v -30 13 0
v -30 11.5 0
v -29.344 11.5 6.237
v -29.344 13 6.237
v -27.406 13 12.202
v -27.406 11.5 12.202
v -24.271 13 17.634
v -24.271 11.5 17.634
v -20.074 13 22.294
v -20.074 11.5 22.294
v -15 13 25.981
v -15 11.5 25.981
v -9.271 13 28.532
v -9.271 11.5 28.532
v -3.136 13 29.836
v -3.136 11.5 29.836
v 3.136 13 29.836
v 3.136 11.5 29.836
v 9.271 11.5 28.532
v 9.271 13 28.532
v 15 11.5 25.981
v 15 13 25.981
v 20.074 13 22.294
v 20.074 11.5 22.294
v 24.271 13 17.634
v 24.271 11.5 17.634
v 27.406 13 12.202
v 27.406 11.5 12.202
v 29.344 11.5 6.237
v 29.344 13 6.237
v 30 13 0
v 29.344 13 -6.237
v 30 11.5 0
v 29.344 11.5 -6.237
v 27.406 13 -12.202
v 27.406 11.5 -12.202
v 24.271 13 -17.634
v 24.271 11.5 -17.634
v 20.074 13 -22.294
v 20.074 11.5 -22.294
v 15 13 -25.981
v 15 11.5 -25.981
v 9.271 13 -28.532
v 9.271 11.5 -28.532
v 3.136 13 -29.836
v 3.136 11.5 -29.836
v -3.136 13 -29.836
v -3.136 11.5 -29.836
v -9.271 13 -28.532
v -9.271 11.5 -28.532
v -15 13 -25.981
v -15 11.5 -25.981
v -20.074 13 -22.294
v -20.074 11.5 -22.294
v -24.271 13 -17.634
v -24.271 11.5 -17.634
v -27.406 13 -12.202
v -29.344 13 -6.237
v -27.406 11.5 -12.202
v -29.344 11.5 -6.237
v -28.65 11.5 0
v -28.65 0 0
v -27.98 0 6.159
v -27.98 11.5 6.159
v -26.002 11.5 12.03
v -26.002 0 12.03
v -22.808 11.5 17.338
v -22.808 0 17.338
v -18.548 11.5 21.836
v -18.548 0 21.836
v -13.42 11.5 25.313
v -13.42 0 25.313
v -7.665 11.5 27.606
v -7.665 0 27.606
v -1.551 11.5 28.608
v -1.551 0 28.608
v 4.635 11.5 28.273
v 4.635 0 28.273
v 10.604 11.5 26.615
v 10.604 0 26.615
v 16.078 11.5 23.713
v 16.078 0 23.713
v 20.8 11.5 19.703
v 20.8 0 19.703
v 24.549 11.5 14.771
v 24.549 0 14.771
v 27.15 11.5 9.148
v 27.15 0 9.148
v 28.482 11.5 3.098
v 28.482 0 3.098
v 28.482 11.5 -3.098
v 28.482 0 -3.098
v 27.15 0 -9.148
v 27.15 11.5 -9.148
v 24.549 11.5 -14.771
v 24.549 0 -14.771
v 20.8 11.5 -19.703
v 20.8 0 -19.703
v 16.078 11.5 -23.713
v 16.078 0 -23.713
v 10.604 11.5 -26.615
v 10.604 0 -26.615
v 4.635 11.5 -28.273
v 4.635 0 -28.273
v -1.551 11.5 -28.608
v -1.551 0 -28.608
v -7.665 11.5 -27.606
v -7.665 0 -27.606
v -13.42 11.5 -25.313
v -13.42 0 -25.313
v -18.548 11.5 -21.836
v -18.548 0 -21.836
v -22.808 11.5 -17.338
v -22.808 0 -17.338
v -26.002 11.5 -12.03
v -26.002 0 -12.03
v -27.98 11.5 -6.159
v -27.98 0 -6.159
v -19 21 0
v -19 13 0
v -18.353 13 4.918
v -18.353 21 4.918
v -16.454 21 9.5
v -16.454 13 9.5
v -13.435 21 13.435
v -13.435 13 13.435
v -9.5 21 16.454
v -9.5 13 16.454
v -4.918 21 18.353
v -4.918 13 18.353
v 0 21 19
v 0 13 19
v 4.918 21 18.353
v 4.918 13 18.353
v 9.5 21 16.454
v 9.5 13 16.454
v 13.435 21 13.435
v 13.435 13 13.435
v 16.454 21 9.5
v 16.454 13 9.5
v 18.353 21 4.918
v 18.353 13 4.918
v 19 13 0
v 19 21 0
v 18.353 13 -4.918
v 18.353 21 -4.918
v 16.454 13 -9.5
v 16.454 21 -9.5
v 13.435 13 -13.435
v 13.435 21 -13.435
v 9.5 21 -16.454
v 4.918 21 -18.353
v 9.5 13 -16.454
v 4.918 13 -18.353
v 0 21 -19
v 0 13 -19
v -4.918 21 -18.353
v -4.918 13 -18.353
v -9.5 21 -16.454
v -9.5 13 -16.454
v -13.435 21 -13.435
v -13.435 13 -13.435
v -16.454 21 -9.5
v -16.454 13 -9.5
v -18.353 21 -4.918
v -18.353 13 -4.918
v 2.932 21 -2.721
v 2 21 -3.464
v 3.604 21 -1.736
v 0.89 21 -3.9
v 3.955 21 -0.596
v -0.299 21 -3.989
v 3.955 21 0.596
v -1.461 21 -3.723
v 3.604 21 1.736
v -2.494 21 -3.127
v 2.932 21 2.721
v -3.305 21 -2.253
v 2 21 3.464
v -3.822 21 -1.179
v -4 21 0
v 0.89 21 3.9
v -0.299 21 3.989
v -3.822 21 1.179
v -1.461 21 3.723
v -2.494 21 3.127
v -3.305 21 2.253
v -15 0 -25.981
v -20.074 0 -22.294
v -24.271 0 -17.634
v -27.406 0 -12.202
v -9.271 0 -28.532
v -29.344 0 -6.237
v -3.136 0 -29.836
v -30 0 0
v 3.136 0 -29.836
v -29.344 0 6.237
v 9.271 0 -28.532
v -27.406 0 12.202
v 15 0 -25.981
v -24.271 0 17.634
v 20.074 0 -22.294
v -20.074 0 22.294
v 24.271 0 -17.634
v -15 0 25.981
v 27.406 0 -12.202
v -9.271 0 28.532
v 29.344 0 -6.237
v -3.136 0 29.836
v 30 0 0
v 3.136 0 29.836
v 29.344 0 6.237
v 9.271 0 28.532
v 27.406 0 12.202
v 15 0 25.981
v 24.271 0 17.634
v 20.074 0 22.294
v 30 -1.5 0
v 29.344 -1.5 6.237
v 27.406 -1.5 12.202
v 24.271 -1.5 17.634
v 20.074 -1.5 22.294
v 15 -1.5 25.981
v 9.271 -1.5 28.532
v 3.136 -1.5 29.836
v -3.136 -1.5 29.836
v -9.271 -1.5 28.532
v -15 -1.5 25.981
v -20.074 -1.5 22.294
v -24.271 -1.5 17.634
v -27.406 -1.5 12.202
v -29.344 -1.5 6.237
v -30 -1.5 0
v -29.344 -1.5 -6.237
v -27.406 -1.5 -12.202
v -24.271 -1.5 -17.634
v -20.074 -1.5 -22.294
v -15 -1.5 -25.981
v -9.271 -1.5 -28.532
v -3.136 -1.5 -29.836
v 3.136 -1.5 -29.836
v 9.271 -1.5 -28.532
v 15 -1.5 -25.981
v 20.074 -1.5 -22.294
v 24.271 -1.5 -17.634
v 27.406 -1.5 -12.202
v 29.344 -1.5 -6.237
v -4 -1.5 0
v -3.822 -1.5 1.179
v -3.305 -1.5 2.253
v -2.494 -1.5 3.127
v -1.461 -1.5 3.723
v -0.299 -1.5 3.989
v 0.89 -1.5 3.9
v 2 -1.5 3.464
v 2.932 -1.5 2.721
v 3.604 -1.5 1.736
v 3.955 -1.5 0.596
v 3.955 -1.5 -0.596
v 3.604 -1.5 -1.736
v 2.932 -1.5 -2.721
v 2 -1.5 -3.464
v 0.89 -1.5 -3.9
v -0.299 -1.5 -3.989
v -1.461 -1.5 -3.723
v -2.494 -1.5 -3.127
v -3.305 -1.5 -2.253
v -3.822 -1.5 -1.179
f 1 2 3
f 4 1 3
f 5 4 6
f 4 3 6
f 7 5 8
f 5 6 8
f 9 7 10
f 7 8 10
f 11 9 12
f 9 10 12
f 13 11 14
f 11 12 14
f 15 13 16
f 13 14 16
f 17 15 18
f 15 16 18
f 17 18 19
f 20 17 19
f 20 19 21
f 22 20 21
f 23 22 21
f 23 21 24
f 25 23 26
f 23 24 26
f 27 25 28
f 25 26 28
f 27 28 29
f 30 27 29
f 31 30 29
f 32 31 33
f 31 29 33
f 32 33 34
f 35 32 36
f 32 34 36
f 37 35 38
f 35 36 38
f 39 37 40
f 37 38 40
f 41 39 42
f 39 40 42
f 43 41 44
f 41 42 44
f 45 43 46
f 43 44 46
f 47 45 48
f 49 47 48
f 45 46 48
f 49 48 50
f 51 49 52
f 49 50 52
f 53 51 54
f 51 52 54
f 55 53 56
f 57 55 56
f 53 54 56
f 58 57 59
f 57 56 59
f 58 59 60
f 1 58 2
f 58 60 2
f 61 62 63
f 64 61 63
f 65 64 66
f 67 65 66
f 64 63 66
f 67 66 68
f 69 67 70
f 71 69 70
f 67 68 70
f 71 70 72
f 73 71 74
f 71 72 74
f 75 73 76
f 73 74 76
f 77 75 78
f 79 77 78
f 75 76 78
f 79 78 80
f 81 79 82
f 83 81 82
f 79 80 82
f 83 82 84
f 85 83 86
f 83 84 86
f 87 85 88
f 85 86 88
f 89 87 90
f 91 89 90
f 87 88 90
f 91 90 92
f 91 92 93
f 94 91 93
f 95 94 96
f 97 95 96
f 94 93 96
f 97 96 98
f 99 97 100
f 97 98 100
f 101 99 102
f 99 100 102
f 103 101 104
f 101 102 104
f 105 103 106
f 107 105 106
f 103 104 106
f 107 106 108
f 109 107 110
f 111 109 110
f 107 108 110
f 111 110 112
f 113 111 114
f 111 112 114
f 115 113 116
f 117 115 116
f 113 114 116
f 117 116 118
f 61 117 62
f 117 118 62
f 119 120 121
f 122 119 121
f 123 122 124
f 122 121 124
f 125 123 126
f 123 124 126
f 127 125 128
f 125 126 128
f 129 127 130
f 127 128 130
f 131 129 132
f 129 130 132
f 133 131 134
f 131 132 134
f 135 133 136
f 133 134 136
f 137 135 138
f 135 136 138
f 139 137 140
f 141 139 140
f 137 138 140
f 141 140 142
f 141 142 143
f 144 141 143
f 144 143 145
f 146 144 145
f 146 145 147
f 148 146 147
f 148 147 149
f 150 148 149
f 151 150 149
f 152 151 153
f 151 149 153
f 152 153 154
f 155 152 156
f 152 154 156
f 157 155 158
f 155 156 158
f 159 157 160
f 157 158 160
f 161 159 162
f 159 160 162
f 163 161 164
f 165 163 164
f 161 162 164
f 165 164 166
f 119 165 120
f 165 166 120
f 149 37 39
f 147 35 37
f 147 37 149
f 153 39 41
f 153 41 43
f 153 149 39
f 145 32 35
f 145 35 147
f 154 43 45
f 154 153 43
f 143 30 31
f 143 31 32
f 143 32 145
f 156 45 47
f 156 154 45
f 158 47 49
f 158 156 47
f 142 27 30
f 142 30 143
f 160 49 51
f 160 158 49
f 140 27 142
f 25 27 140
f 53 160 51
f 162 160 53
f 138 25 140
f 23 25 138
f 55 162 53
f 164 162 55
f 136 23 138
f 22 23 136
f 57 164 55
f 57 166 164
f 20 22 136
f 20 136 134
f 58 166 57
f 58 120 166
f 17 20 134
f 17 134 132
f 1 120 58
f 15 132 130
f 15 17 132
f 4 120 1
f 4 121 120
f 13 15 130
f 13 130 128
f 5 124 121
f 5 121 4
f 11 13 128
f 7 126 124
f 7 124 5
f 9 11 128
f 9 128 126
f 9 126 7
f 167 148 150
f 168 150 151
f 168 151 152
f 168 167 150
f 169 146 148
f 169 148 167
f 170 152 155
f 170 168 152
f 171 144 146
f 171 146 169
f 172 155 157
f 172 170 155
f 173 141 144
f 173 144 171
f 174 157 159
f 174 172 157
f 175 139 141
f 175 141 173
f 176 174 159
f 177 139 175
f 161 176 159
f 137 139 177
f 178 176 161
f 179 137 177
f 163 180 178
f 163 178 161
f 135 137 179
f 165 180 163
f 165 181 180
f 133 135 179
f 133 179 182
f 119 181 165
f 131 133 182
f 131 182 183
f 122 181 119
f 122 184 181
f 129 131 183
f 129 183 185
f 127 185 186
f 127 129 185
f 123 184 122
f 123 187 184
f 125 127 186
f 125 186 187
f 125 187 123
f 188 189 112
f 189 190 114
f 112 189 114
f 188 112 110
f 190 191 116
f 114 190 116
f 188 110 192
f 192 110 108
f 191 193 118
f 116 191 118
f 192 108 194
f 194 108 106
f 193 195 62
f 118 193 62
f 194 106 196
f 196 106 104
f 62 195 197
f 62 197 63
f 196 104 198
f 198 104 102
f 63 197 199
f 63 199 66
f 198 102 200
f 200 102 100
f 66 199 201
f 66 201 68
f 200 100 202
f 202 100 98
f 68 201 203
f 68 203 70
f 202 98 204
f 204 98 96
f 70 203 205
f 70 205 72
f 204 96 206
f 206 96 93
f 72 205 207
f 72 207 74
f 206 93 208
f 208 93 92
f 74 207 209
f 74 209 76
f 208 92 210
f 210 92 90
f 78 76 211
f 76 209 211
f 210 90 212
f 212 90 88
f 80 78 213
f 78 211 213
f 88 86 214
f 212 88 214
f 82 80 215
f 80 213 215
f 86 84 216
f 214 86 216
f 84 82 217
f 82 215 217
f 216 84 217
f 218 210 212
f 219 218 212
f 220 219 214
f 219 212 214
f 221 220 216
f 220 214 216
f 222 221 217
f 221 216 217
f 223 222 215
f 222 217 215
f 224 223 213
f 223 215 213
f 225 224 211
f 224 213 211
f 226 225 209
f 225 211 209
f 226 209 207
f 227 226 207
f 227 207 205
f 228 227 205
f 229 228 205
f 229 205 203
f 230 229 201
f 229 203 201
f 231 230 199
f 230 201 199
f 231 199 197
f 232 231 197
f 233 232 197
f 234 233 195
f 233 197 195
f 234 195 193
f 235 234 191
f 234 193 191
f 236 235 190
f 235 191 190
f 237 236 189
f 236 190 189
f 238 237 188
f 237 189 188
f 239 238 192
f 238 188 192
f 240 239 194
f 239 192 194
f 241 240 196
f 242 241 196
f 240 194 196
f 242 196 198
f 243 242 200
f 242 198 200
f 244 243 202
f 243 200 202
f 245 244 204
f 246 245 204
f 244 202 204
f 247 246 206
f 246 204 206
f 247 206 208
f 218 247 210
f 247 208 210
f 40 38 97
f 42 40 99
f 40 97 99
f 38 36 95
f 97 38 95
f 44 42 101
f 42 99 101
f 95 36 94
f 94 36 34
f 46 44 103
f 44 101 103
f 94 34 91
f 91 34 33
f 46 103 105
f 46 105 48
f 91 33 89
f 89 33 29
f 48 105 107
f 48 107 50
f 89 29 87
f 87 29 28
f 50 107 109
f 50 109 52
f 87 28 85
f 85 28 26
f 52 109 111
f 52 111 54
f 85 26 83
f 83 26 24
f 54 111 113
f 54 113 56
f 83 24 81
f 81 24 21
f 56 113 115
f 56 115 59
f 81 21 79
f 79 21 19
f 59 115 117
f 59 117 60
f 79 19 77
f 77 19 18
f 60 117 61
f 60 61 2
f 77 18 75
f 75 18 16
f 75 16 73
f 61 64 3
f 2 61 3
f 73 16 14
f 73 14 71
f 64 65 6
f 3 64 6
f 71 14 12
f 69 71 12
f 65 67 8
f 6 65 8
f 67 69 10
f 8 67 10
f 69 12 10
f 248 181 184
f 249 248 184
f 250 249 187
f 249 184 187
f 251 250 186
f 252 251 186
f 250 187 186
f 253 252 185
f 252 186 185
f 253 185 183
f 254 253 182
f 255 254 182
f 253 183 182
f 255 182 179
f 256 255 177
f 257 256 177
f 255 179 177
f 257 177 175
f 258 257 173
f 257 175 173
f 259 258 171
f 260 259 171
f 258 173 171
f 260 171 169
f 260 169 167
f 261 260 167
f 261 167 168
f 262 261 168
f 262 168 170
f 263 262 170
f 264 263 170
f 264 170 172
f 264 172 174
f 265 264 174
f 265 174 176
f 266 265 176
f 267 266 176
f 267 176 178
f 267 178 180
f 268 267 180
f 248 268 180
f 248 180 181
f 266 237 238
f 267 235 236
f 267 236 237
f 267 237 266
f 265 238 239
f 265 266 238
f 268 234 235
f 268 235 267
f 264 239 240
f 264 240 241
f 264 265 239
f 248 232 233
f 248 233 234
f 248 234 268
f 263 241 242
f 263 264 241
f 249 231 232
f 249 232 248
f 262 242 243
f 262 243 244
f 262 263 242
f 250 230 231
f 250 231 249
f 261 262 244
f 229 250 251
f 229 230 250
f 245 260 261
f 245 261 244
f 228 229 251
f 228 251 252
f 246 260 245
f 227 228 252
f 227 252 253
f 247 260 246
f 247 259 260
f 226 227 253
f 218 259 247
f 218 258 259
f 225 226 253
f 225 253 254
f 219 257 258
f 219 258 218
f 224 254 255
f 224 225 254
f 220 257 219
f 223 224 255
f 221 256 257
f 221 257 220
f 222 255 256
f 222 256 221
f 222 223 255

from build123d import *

# Parameters (mm, degrees)
F0_R     = 30
F1_DEPTH = 1.5
F2_R     = 28.65
F3_DEPTH = 11.5
F4_R     = 30
F5_DEPTH = 1.5
F6_R     = 19
F7_DEPTH = 8
F8_R     = 4
F9_DEPTH = 22.501


with BuildPart() as f1:
    # F0 (on Front) → F1 (new body)
    with BuildSketch(Plane.XZ):
        Circle(F0_R)
    extrude(amount=F1_DEPTH)

    # F2 (on face) → F3 (join)
    with BuildSketch(Plane(origin=(0, 0, 0), x_dir=(-1, 0, 0), z_dir=(0, 1, 0))):
        Circle(F2_R)
    extrude(amount=F3_DEPTH)

    # F4 (on face) → F5 (join)
    with BuildSketch(Plane(origin=(0, 11.5, 0), x_dir=(-1, 0, 0), z_dir=(0, 1, 0))):
        Circle(F4_R)
    extrude(amount=F5_DEPTH)

    # F6 (on face) → F7 (join)
    with BuildSketch(Plane(origin=(0, 13, 0), x_dir=(-1, 0, 0), z_dir=(0, 1, 0))):
        Circle(F6_R)
    extrude(amount=F7_DEPTH)

    # F8 (on face) → F9 (cut, through all)
    with BuildSketch(Plane(origin=(0, 21, 0), x_dir=(-1, 0, 0), z_dir=(0, 1, 0))):
        Circle(F8_R)
    extrude(amount=-F9_DEPTH, mode=Mode.SUBTRACT)


solid = f1.part
